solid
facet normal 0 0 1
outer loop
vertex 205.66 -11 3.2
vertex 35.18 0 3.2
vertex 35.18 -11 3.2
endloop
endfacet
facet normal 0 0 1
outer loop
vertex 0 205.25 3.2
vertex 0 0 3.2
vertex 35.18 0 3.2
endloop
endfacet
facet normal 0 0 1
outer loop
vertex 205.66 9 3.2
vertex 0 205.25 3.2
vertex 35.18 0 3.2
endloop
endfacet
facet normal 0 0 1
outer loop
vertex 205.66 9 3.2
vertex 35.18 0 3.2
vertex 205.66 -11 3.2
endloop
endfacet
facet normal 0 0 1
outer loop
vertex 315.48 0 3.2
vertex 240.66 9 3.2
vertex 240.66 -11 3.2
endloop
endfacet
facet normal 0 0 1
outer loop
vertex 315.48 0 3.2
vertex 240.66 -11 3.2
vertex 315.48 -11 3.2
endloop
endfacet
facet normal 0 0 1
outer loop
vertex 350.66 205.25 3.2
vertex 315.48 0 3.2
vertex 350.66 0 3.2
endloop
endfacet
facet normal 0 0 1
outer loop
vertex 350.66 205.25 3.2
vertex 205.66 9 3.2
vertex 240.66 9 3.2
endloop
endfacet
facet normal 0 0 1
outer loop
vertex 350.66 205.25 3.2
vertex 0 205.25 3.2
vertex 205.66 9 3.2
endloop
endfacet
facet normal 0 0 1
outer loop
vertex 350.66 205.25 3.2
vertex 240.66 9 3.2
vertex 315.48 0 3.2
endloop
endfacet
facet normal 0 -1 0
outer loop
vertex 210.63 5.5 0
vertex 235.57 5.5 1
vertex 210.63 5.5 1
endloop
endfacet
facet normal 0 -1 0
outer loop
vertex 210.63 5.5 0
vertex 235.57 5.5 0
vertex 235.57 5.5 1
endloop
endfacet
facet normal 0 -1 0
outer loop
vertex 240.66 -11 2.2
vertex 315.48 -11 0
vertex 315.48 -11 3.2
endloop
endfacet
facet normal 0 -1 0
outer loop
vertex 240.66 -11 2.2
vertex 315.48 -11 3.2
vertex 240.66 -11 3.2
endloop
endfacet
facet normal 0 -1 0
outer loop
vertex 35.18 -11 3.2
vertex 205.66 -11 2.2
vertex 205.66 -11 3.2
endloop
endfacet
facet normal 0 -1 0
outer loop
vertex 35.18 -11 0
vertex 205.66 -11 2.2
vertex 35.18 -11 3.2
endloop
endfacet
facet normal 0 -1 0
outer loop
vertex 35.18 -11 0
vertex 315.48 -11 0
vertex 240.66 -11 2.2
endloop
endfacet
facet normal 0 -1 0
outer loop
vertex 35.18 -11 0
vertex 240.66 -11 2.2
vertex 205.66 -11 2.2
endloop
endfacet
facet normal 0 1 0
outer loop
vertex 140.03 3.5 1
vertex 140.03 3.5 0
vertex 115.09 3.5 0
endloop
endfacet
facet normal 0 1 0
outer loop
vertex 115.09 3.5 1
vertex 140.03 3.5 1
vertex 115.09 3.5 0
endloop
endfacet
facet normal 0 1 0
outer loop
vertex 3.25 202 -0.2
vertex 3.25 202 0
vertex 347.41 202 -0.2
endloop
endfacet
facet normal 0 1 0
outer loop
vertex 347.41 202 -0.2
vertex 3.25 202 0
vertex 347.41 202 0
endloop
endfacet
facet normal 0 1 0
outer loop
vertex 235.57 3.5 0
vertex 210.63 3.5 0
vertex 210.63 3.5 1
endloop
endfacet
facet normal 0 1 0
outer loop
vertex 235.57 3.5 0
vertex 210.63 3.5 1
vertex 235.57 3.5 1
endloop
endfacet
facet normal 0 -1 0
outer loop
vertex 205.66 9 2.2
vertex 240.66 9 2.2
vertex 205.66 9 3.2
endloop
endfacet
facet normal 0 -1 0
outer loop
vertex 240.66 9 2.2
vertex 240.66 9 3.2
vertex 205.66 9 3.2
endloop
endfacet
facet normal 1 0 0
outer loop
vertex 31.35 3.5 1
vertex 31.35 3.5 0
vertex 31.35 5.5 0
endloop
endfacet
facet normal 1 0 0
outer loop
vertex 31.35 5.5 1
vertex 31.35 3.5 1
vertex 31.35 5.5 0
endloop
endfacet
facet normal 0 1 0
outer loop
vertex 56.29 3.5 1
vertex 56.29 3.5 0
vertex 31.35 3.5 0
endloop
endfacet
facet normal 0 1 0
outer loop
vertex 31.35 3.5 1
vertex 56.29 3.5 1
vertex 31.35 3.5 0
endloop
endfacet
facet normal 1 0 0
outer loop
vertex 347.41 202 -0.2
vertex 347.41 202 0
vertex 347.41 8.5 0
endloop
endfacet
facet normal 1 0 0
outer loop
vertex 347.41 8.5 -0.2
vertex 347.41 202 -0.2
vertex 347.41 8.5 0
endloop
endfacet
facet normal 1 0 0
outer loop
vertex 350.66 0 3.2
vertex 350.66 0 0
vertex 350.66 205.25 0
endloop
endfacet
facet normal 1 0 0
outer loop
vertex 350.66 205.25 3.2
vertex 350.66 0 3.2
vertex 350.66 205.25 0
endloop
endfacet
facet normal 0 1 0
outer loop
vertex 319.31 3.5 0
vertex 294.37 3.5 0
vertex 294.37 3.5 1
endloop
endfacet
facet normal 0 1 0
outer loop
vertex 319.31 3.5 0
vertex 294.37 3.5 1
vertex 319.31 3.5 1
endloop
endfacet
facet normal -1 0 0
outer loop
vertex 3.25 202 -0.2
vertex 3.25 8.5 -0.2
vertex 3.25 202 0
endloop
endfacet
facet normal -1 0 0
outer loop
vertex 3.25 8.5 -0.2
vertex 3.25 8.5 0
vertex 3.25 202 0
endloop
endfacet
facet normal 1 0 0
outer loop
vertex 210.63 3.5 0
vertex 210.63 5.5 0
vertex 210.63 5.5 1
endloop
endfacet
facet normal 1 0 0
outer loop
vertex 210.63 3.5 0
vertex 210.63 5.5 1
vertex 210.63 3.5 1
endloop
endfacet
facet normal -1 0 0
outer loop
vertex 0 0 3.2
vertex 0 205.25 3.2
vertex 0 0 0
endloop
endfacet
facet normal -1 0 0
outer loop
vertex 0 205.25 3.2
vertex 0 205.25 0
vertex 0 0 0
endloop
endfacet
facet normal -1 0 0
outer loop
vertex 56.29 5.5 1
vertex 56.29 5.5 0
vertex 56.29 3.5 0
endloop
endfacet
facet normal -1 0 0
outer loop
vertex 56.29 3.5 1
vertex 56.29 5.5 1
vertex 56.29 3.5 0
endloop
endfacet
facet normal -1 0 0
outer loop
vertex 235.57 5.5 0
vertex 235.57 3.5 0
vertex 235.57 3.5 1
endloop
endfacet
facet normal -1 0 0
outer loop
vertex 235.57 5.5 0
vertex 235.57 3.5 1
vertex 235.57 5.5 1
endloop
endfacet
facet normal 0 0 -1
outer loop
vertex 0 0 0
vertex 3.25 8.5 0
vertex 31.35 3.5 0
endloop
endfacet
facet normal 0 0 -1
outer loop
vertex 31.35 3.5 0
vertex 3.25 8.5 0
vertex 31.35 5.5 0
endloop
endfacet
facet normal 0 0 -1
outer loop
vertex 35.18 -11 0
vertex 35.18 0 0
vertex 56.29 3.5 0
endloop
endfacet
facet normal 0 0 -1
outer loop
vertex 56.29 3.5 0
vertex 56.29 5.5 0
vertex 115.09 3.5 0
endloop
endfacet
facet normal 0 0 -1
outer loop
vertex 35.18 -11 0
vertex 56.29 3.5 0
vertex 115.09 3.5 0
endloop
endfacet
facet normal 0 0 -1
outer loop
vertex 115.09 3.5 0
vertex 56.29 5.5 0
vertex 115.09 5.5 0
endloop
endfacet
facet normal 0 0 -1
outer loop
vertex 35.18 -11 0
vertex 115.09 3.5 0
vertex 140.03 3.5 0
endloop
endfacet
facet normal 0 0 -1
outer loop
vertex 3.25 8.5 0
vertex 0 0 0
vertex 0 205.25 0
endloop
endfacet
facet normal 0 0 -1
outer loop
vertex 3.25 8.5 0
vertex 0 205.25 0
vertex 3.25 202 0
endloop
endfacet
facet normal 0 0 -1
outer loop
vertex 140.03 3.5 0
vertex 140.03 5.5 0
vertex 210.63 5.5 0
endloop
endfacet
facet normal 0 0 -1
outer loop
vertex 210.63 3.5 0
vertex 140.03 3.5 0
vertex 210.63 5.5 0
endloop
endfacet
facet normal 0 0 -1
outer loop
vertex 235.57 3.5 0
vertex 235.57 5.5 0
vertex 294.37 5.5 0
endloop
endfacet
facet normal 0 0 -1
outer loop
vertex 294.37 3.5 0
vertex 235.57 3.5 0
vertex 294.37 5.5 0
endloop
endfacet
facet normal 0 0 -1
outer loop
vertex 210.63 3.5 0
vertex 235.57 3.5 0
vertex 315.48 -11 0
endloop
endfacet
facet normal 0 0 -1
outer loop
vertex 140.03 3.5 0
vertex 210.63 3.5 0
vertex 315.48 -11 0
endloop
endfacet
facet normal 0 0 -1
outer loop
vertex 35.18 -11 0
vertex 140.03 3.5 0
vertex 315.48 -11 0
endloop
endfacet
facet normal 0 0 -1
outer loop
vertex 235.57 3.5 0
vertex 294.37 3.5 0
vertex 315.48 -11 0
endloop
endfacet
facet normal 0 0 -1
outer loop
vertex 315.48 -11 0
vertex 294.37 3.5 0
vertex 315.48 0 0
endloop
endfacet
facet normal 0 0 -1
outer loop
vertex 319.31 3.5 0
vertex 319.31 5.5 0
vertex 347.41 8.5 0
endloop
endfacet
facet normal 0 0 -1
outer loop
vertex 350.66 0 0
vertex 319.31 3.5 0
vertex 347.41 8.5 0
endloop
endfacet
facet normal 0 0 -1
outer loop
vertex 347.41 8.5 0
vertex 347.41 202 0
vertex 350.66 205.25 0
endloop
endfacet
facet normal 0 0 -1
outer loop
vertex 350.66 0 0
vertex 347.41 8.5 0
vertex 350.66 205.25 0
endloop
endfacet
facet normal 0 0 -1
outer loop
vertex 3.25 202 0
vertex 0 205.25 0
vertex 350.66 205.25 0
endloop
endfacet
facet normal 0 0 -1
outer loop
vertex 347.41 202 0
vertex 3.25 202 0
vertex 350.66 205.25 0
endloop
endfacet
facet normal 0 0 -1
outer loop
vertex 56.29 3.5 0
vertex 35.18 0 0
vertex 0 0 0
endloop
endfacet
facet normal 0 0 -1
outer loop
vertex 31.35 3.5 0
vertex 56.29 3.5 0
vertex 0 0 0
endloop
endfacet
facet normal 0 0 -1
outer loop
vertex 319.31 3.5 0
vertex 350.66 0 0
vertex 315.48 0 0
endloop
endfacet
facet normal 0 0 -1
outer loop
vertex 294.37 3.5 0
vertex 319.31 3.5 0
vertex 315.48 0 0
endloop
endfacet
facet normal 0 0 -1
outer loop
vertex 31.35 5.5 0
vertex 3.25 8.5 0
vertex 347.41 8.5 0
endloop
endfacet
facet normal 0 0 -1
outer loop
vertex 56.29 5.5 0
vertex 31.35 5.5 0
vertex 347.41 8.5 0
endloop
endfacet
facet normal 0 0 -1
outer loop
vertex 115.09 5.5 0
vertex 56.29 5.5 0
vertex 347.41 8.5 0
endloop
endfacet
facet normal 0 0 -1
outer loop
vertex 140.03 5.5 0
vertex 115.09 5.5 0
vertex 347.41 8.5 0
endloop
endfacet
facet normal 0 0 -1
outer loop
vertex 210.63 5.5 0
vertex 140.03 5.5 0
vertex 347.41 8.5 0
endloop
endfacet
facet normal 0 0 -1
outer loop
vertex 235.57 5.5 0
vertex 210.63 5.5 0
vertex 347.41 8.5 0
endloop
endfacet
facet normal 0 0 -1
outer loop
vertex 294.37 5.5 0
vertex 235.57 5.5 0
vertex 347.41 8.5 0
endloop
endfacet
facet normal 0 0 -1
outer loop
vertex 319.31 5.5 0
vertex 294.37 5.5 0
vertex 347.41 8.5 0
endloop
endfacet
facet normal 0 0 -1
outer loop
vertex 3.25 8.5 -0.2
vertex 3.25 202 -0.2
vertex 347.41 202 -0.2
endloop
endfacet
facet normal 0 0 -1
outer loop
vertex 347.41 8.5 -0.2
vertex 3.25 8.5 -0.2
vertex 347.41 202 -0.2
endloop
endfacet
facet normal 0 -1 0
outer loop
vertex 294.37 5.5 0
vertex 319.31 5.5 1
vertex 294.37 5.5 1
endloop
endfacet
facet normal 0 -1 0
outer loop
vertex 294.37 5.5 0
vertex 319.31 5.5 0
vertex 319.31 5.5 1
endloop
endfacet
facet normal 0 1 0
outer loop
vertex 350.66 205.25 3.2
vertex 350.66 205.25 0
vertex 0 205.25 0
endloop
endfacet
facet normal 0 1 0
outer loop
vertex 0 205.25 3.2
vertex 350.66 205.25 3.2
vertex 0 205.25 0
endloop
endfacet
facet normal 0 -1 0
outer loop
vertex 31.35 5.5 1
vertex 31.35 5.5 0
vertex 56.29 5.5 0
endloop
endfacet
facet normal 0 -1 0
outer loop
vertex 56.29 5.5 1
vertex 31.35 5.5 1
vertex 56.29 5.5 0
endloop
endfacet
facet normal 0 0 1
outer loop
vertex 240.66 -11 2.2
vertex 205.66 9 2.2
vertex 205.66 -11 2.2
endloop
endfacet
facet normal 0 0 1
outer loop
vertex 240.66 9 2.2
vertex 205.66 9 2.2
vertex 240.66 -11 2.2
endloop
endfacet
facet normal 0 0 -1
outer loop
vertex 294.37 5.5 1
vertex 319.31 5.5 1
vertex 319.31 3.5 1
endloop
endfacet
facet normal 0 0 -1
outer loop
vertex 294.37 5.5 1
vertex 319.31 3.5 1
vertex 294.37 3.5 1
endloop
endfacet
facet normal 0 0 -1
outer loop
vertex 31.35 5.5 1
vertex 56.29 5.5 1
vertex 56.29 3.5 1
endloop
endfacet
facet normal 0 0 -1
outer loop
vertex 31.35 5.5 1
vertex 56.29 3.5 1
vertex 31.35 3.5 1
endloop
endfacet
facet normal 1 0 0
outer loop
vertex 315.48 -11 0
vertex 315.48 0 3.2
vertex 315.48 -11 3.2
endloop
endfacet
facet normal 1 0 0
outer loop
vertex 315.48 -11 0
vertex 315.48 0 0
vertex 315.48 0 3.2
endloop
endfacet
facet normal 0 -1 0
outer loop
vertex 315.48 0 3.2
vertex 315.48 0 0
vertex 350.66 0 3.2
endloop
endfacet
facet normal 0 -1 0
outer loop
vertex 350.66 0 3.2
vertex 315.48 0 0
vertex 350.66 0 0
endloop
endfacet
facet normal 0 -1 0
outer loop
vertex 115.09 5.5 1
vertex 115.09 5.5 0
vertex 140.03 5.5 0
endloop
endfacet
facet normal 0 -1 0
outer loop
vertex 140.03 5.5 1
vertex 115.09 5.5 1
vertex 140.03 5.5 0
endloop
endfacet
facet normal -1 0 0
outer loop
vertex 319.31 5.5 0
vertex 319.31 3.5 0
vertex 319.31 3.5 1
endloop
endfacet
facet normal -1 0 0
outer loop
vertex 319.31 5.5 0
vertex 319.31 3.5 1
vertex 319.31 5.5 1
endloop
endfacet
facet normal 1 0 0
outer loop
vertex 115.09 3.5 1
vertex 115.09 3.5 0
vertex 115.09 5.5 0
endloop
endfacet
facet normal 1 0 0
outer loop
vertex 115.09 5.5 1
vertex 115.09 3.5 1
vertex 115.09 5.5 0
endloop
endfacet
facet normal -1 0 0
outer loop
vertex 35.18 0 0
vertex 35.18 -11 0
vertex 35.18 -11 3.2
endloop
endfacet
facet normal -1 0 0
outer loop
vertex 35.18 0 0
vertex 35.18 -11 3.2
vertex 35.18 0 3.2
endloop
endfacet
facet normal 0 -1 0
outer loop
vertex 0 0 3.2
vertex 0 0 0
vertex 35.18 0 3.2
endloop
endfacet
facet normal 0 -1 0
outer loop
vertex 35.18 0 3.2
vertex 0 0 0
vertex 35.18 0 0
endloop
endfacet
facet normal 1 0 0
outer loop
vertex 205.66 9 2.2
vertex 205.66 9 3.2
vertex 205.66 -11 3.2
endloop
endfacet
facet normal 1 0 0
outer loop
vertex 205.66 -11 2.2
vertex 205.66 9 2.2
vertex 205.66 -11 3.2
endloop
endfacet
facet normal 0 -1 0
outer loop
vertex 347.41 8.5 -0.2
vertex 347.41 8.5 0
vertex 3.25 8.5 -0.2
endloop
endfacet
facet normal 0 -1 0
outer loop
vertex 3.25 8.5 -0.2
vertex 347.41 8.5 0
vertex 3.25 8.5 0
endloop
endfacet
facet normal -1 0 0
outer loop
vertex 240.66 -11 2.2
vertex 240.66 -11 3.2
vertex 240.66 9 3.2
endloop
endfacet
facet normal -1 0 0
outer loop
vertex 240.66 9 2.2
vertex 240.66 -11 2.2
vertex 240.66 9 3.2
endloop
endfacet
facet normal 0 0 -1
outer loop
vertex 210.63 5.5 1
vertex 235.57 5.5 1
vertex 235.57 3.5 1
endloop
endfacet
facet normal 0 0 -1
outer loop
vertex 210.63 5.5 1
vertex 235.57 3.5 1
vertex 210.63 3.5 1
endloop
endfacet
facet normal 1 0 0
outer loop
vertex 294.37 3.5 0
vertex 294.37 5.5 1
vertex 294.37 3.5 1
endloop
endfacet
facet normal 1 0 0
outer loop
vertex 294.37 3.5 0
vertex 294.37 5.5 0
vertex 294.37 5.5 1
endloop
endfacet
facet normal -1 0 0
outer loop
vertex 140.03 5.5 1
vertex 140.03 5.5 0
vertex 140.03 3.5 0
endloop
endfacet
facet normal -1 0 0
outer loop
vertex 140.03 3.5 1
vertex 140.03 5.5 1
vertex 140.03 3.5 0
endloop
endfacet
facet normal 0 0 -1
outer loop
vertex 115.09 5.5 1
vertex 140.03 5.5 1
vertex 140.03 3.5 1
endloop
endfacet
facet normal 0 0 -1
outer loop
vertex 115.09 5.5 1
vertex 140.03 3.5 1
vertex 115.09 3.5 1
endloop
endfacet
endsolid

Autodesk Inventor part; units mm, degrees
ref_plane "YZ Plane" through (0, 0, 0) normal (1, 0, 0) x (0, 1, 0)
ref_plane "XZ Plane" through (0, 0, 0) normal (0, 1, 0) x (-1, 0, 0)
ref_plane "XY Plane" through (0, 0, 0) normal (0, 0, 1) x (1, 0, 0)
sketch "Эскиз1" plane through (0, 0, 0) normal (0, 0, 1) x (1, 0, 0)
  line L0 (0, 0) -> (350.66, 0)
  line L1 (350.66, 0) -> (350.66, 205.25)
  line L2 (350.66, 205.25) -> (0, 205.25)
  line L3 (0, 205.25) -> (0, 0)
  line L4 (3.25, 202) -> (347.41, 202)
  line L5 (347.41, 202) -> (347.41, 8.5)
  line L6 (347.41, 8.5) -> (3.25, 8.5)
  line L7 (3.25, 8.5) -> (3.25, 202)
  line L8 (35.18, 0) -> (315.48, 0)
  line L9 (315.48, 0) -> (315.48, -11)
  line L10 (315.48, -11) -> (35.18, -11)
  line L11 (35.18, -11) -> (35.18, 0)
  line L12 (175.33, 8.5) -> (175.33, 37.7602)
  point P0 (175.33, 202)
  point P1 (175.33, 205.25)
  point P2 (175.33, -11)
  dimension "d0" = 350.66
  dimension "d1" = 205.25
  dimension "d2" = 344.16
  dimension "d3" = 193.5
  dimension "d4" = 3.25
  dimension "d5" = 8.5
  dimension "d6" = 3.25
  dimension "d7" = 216.25
  dimension "d9" = 280.3
  dimension "d28" = 35.18
extrude "Выдавливание1" add sketch "Эскиз1" along normal blind 3.2
sketch "Эскиз2" plane through (0, 0, 3.2) normal (0, 0, 1) x (1, 0, 0)
  line L0 (0, 0) -> (35.18, 0) projected
  line L1 (35.18, 0) -> (35.18, -11) projected
  line L2 (35.18, -11) -> (315.48, -11) projected
  line L3 (315.48, -11) -> (315.48, 0) projected
  line L4 (315.48, 0) -> (350.66, 0) projected
  line L5 (350.66, 0) -> (350.66, 205.25) projected
  line L6 (350.66, 205.25) -> (0, 205.25) projected
  line L7 (0, 205.25) -> (0, 0) projected
  line L8 (347.41, 202) -> (347.41, 8.5) projected
  line L9 (347.41, 8.5) -> (3.25, 8.5) projected
  line L10 (3.25, 8.5) -> (3.25, 202) projected
  line L11 (3.25, 202) -> (347.41, 202) projected
extrude "Выдавливание2" add sketch "Эскиз2" against normal blind 3.4 contours L8 L9 L10 L11
sketch "Эскиз3" plane through (0, 0, 0) normal (0, 0, -1) x (-1, 0, 0)
  line L0 (0, 0) -> (-35.18, 0) projected
  line L1 (0, 205.25) -> (0, 0) projected
  line L2 (-350.66, 205.25) -> (0, 205.25) projected
  line L3 (-350.66, 0) -> (-350.66, 205.25) projected
  line L4 (-315.48, 0) -> (-350.66, 0) projected
  line L5 (-315.48, -11) -> (-315.48, 0) projected
  line L6 (-35.18, -11) -> (-315.48, -11) projected
  line L7 (-35.18, 0) -> (-35.18, -11) projected
  line L8 (-347.41, 202) -> (-347.41, 8.5) projected
  line L9 (-3.25, 202) -> (-347.41, 202) projected
  line L10 (-3.25, 8.5) -> (-3.25, 202) projected
  line L11 (-347.41, 8.5) -> (-3.25, 8.5) projected
  line L12 (-175.33, -11) -> (-175.33, 1.1845)
  line L13 (-235.57, 5.5) -> (-210.63, 5.5)
  line L14 (-210.63, 5.5) -> (-210.63, 3.5)
  line L15 (-210.63, 3.5) -> (-235.57, 3.5)
  line L16 (-235.57, 3.5) -> (-235.57, 5.5)
  line L17 (-319.31, 5.5) -> (-294.37, 5.5)
  line L18 (-294.37, 5.5) -> (-294.37, 3.5)
  line L19 (-294.37, 3.5) -> (-319.31, 3.5)
  line L20 (-319.31, 3.5) -> (-319.31, 5.5)
  line L21 (-115.09, 5.5) -> (-140.03, 5.5)
  line L22 (-140.03, 5.5) -> (-140.03, 3.5)
  line L23 (-140.03, 3.5) -> (-115.09, 3.5)
  line L24 (-115.09, 3.5) -> (-115.09, 5.5)
  line L25 (-31.35, 5.5) -> (-56.29, 5.5)
  line L26 (-56.29, 5.5) -> (-56.29, 3.5)
  line L27 (-56.29, 3.5) -> (-31.35, 3.5)
  line L28 (-31.35, 3.5) -> (-31.35, 5.5)
  point P0 (-294.37, 4.5)
  point P1 (-235.57, 4.5)
  point P2 (-56.29, 4.5)
  point P3 (-115.09, 4.5)
  dimension "d14" = 24.94
  dimension "d15" = 35.3
  dimension "d16" = 3
  dimension "d17" = 2
  dimension "d18" = 2
  dimension "d19" = 24.94
  dimension "d20" = 58.8
extrude "Выдавливание3" cut sketch "Эскиз3" against normal blind 1 contours L13 L14 L15 L16 | L17 L18 L19 L20 | L24 L23 L22 L21 | L28 L27 L26 L25
sketch "Эскиз5" plane through (0, 0, 3.2) normal (0, 0, 1) x (1, 0, 0)
  line L0 (0, 0) -> (35.18, 0) projected
  line L1 (35.18, 0) -> (35.18, -11) projected
  line L2 (35.18, -11) -> (315.48, -11) projected
  line L3 (315.48, -11) -> (315.48, 0) projected
  line L4 (315.48, 0) -> (350.66, 0) projected
  line L5 (350.66, 0) -> (350.66, 205.25) projected
  line L6 (350.66, 205.25) -> (0, 205.25) projected
  line L7 (0, 205.25) -> (0, 0) projected
  line L8 (205.66, -11) -> (240.66, -11)
  line L9 (240.66, -11) -> (240.66, 9)
  line L10 (240.66, 9) -> (205.66, 9)
  line L11 (205.66, 9) -> (205.66, -11)
  dimension "d23" = 110
  dimension "d24" = 20
  dimension "d25" = 35
extrude "Выдавливание4" cut sketch "Эскиз5" against normal blind 1 contours L11 L10 L9 L2
equation "\"d19\" = d14"
properties part number "Матрица от ноутбука 15.6 NV156FHM-N42ipt"
